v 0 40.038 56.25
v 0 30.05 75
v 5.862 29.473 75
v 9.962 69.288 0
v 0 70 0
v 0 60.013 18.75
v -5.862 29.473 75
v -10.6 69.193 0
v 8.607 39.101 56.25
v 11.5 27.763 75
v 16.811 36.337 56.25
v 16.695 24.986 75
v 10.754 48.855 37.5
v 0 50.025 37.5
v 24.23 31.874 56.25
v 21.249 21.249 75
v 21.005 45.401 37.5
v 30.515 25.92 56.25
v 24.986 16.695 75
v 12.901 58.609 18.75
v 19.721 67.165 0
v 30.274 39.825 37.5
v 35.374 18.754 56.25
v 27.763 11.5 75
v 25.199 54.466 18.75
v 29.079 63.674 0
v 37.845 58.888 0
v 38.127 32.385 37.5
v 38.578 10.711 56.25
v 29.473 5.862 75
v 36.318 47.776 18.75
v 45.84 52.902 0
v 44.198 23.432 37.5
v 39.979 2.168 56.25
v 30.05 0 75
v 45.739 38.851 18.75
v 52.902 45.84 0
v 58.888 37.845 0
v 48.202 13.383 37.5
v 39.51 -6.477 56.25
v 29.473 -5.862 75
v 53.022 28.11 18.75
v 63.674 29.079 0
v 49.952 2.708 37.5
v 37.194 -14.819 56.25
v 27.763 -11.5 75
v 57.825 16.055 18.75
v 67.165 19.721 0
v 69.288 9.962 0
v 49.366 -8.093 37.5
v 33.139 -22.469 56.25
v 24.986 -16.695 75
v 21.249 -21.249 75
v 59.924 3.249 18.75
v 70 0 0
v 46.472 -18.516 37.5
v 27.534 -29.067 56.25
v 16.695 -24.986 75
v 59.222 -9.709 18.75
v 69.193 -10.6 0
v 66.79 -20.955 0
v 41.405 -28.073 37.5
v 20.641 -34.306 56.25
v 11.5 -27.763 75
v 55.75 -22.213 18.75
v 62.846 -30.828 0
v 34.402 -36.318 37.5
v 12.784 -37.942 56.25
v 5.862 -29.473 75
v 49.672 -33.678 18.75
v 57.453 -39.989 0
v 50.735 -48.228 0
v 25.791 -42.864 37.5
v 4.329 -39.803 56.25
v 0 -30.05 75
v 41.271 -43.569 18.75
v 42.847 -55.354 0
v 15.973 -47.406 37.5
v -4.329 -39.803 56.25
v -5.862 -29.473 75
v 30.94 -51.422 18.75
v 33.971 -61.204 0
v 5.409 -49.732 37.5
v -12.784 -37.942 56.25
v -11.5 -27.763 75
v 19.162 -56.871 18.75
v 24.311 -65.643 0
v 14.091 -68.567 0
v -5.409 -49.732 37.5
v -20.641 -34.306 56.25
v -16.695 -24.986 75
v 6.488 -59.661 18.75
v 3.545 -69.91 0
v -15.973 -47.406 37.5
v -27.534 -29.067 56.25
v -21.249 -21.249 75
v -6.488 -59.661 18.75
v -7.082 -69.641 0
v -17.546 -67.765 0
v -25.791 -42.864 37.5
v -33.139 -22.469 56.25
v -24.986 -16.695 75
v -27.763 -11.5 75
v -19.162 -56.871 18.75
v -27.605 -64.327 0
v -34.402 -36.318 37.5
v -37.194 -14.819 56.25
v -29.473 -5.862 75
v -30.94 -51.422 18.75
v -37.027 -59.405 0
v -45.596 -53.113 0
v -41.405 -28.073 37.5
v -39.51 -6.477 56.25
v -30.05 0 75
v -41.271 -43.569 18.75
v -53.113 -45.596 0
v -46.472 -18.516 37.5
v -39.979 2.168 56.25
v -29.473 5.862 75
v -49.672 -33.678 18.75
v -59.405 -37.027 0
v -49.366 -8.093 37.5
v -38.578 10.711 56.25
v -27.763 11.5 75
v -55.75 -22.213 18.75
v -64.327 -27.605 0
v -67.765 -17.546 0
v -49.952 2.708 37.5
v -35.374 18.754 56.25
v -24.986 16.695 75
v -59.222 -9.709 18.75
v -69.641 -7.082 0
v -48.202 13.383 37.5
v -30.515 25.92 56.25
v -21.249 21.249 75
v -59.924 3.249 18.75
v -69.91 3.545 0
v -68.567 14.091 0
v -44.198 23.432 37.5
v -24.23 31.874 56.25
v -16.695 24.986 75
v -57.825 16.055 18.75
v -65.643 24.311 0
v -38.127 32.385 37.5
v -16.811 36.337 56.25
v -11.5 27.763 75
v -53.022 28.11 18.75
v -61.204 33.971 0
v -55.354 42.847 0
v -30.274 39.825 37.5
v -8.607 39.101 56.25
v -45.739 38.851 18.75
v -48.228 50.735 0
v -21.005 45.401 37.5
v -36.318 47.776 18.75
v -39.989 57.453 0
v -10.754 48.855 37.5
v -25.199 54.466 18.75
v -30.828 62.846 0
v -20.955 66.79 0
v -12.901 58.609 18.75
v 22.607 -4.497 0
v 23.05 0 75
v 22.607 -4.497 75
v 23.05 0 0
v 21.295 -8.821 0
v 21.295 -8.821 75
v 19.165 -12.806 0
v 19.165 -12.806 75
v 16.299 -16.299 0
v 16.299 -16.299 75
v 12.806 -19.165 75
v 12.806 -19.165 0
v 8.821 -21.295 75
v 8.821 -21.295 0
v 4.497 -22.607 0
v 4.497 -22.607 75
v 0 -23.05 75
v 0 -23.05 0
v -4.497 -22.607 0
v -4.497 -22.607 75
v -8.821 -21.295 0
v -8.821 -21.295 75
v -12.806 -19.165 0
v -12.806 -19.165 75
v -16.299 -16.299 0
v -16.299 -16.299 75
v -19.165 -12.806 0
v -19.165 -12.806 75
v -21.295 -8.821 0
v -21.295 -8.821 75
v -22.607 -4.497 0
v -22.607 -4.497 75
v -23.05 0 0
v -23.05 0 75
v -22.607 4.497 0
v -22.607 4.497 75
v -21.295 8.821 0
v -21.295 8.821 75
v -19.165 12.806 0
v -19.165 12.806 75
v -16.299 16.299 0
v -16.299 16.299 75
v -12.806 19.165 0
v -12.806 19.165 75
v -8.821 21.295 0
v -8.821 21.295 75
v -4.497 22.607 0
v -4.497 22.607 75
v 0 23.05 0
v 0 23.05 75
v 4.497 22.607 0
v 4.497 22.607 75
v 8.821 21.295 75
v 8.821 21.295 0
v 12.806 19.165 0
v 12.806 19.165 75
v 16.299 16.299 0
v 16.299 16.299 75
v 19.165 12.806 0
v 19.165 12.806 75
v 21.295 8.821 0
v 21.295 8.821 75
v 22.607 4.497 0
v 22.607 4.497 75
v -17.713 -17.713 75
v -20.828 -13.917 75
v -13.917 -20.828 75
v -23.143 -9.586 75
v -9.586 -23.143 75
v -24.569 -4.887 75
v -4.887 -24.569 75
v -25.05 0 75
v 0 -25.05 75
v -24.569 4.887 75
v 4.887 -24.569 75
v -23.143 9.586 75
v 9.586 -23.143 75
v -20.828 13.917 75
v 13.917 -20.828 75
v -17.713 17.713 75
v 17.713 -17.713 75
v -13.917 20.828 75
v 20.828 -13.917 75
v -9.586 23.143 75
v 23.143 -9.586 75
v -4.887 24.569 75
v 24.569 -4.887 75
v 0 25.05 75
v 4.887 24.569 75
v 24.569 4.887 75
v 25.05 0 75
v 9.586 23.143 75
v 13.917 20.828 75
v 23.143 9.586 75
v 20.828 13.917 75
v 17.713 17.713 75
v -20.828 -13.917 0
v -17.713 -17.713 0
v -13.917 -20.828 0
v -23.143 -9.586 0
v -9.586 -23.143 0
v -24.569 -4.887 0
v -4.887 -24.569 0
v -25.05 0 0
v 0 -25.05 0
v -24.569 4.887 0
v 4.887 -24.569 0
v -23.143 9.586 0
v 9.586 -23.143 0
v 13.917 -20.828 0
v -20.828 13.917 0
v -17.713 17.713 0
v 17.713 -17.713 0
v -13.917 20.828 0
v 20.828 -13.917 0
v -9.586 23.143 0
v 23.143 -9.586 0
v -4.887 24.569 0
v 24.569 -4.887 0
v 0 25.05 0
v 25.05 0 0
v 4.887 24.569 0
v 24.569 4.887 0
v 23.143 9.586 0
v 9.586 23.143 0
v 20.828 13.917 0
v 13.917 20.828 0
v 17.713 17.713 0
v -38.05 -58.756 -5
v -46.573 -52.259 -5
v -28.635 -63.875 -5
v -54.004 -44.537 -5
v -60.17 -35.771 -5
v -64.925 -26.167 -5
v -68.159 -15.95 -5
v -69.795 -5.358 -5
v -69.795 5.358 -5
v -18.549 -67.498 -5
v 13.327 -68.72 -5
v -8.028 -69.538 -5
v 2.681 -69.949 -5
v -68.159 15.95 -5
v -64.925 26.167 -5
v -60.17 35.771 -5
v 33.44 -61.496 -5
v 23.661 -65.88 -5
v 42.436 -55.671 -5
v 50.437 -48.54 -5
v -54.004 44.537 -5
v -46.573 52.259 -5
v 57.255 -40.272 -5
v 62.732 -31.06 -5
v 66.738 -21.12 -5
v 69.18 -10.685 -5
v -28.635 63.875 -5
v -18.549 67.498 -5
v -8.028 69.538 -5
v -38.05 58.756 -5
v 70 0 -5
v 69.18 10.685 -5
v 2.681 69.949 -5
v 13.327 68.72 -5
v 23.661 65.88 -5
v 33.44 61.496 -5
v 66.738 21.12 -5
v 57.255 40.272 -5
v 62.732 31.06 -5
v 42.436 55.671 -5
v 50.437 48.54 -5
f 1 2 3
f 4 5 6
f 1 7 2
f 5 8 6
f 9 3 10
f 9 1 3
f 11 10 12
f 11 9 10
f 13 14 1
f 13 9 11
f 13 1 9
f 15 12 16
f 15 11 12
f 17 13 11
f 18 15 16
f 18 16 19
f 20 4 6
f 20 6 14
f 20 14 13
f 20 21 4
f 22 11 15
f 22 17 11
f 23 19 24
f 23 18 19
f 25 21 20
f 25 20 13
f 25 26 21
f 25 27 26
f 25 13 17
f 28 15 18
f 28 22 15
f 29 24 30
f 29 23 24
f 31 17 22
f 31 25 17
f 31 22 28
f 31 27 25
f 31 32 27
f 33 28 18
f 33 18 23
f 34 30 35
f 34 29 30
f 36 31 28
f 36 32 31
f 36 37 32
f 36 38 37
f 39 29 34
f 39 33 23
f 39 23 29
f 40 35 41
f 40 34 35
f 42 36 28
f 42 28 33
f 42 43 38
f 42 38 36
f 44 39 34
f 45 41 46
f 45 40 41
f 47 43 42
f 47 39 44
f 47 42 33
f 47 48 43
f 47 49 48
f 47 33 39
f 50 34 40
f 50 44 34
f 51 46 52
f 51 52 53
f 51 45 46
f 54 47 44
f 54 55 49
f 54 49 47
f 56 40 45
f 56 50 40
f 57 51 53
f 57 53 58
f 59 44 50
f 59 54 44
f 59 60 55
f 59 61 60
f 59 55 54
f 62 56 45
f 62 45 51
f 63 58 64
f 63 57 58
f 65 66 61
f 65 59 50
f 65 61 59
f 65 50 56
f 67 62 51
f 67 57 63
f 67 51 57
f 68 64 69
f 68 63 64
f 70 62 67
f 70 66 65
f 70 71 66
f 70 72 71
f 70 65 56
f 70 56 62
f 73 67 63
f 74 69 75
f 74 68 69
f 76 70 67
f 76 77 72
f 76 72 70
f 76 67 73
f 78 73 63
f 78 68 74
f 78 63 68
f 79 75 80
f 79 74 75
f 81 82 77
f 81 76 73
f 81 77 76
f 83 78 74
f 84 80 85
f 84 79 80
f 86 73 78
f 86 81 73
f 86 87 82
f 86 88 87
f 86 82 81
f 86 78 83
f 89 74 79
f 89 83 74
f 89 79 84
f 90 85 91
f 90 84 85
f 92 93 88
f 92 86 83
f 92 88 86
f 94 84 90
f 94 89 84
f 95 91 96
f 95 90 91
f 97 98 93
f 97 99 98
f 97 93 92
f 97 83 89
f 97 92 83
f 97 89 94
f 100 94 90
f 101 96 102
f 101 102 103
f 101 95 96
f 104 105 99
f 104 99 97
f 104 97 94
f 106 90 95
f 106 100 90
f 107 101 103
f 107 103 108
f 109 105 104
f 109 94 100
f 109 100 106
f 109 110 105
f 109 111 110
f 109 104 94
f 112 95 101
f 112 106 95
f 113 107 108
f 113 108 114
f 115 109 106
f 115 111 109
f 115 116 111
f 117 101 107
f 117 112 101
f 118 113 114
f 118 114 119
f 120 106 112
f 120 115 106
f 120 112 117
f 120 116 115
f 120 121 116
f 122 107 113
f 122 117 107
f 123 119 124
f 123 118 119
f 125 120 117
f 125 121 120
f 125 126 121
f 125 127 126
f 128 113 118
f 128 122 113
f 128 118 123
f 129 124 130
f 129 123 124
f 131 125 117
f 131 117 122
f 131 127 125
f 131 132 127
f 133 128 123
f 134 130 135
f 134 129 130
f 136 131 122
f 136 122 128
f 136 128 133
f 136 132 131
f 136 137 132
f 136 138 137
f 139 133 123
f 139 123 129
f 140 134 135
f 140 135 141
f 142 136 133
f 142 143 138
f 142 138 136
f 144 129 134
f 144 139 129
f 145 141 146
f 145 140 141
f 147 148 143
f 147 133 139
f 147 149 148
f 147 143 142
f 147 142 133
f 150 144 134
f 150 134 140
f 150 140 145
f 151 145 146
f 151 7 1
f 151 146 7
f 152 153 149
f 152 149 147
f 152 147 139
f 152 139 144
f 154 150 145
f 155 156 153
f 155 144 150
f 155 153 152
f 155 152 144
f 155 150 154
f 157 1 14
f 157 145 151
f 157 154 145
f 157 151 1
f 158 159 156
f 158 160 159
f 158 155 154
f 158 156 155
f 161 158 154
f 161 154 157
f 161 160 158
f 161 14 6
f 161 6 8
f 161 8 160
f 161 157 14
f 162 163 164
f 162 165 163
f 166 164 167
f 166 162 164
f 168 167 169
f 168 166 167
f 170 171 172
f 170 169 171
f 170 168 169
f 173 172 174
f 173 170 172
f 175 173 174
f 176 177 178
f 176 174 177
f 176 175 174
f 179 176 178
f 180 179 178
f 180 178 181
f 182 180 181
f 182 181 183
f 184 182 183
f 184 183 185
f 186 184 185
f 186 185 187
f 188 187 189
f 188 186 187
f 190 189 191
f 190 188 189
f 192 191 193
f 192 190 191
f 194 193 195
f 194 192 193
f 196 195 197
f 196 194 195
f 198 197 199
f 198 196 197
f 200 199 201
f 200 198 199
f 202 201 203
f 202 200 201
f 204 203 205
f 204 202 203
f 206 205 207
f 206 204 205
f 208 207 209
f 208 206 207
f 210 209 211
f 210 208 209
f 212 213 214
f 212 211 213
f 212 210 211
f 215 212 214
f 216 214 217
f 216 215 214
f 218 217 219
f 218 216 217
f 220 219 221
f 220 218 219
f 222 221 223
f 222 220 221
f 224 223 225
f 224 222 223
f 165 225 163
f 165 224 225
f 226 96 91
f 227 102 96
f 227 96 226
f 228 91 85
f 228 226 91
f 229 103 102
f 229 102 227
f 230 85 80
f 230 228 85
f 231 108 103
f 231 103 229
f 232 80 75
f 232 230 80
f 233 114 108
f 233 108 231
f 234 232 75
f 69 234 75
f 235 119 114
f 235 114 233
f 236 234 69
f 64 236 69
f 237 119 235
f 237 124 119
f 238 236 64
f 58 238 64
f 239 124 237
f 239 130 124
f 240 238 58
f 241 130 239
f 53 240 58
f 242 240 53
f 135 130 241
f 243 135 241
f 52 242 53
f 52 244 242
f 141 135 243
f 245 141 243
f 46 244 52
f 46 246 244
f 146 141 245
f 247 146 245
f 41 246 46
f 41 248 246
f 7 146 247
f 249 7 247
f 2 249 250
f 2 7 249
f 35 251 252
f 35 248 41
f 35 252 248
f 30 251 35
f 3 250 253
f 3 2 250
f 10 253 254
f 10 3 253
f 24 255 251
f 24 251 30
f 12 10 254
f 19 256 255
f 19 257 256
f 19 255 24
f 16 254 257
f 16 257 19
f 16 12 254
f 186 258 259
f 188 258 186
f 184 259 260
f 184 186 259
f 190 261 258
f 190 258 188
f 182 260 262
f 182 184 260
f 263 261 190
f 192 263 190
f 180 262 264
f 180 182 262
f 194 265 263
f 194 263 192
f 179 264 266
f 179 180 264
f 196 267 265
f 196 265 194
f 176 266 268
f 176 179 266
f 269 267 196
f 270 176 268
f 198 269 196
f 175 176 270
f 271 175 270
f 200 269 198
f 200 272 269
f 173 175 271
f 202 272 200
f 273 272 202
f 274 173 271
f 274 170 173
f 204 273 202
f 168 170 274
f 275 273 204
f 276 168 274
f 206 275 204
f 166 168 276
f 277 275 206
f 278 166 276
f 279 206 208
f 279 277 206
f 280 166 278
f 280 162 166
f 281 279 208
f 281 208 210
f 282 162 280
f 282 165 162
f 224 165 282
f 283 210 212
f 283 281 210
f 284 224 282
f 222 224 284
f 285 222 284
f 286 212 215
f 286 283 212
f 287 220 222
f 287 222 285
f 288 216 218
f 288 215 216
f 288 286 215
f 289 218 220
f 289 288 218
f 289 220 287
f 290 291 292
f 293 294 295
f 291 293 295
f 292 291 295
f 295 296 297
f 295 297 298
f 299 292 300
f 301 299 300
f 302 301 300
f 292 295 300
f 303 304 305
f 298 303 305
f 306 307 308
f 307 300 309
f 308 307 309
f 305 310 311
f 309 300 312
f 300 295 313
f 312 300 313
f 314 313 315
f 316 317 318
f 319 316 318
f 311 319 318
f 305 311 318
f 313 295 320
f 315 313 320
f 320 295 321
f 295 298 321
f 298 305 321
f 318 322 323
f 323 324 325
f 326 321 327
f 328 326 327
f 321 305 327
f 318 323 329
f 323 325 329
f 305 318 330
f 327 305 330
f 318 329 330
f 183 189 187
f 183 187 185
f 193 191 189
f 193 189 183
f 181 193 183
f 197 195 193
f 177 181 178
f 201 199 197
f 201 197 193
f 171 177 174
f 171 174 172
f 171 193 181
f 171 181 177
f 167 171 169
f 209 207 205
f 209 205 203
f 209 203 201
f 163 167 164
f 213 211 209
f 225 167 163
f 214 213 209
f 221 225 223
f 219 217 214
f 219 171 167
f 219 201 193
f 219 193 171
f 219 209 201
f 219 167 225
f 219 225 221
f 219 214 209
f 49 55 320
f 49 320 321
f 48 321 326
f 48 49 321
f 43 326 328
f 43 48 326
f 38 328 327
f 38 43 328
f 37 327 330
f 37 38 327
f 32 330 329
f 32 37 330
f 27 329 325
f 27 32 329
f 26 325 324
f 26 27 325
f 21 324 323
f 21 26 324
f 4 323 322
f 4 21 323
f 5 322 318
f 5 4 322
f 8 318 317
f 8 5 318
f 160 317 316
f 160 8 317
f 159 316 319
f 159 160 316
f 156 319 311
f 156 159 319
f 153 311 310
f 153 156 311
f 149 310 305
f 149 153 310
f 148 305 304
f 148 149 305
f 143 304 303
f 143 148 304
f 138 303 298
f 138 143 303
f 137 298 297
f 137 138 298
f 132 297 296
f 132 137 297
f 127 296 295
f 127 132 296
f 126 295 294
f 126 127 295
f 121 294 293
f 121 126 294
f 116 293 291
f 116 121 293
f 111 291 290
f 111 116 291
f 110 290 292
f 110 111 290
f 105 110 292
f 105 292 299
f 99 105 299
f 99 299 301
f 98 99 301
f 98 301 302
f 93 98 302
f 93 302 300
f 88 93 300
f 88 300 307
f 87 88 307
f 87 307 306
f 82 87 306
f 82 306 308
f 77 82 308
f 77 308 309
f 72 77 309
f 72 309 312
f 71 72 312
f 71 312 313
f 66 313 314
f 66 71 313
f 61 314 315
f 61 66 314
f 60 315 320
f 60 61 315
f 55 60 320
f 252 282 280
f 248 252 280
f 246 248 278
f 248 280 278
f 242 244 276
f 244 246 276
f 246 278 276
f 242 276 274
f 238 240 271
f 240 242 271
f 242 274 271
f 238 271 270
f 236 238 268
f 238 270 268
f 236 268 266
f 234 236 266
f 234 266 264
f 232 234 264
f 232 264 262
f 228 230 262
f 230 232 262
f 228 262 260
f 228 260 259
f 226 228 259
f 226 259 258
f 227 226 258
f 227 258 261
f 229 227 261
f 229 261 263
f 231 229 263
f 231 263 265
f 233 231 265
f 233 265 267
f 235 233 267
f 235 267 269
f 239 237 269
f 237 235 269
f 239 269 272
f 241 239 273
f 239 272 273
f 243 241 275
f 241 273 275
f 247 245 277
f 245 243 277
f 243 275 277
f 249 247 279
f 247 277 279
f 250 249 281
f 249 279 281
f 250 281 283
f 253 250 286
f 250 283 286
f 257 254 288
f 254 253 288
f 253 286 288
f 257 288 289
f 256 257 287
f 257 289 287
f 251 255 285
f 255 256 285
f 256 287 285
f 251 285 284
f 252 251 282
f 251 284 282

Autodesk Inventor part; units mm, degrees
ref_plane "YZ Plane" through (0, 0, 0) normal (1, 0, 0) x (0, 1, 0)
ref_plane "XZ Plane" through (0, 0, 0) normal (0, 1, 0) x (-1, 0, 0)
ref_plane "XY Plane" through (0, 0, 0) normal (0, 0, 1) x (1, 0, 0)
sketch "Skizze1" plane through (0, 0, 0) normal (0, 0, 1) x (1, 0, 0)
  circle A0 centre (0, 0) radius 70
  circle A1 centre (0, 0) radius 25.05
  circle A2 centre (0, 0) radius 23.05
  dimension "d0" = 140
  dimension "d1" = 50.1
  dimension "d2" = 46.1
extrude "Extrusion1" add sketch "Skizze1" against normal blind 5 contours A0 | A1 | A2
extrude "Extrusion2" add sketch "Skizze1" along normal blind 75
sketch "Skizze2" plane through (0, 0, 0) normal (1, 0, 0) x (0, 1, 0)
  line L0 (23.05, 75) -> (23.05, 0) projected
  line L1 (23.05, 0) -> (25.05, 0) projected
  line L2 (25.05, 0) -> (25.05, 75) projected
  line L3 (25.05, 75) -> (70, 75) projected
  line L4 (70, 75) -> (70, -5) projected
  line L5 (70, -5) -> (-70, -5) projected
  line L6 (-70, -5) -> (-70, 75) projected
  line L7 (-70, 75) -> (-25.05, 75) projected
  line L8 (-25.05, 75) -> (-25.05, 0) projected
  line L9 (-25.05, 0) -> (-23.05, 0) projected
  line L10 (-23.05, 0) -> (-23.05, 75) projected
  line L11 (-23.05, 75) -> (23.05, 75) projected
  line L12 (70, 75) -> (70, 0)
  line L13 (0, 75) -> (0, -5) construction
  line L14 (70, 0) -> (30.05, 75)
  line L15 (70, 75) -> (30.05, 75)
  point P0 (0, 0)
  dimension "d7" = 5
revolve "Umdrehung1" cut sketch "Skizze2" angle 360 about axis through (0, 0, 75) along (0, 0, -1) contours L3 L4 L14
properties part number "Zyklon_Konus"
